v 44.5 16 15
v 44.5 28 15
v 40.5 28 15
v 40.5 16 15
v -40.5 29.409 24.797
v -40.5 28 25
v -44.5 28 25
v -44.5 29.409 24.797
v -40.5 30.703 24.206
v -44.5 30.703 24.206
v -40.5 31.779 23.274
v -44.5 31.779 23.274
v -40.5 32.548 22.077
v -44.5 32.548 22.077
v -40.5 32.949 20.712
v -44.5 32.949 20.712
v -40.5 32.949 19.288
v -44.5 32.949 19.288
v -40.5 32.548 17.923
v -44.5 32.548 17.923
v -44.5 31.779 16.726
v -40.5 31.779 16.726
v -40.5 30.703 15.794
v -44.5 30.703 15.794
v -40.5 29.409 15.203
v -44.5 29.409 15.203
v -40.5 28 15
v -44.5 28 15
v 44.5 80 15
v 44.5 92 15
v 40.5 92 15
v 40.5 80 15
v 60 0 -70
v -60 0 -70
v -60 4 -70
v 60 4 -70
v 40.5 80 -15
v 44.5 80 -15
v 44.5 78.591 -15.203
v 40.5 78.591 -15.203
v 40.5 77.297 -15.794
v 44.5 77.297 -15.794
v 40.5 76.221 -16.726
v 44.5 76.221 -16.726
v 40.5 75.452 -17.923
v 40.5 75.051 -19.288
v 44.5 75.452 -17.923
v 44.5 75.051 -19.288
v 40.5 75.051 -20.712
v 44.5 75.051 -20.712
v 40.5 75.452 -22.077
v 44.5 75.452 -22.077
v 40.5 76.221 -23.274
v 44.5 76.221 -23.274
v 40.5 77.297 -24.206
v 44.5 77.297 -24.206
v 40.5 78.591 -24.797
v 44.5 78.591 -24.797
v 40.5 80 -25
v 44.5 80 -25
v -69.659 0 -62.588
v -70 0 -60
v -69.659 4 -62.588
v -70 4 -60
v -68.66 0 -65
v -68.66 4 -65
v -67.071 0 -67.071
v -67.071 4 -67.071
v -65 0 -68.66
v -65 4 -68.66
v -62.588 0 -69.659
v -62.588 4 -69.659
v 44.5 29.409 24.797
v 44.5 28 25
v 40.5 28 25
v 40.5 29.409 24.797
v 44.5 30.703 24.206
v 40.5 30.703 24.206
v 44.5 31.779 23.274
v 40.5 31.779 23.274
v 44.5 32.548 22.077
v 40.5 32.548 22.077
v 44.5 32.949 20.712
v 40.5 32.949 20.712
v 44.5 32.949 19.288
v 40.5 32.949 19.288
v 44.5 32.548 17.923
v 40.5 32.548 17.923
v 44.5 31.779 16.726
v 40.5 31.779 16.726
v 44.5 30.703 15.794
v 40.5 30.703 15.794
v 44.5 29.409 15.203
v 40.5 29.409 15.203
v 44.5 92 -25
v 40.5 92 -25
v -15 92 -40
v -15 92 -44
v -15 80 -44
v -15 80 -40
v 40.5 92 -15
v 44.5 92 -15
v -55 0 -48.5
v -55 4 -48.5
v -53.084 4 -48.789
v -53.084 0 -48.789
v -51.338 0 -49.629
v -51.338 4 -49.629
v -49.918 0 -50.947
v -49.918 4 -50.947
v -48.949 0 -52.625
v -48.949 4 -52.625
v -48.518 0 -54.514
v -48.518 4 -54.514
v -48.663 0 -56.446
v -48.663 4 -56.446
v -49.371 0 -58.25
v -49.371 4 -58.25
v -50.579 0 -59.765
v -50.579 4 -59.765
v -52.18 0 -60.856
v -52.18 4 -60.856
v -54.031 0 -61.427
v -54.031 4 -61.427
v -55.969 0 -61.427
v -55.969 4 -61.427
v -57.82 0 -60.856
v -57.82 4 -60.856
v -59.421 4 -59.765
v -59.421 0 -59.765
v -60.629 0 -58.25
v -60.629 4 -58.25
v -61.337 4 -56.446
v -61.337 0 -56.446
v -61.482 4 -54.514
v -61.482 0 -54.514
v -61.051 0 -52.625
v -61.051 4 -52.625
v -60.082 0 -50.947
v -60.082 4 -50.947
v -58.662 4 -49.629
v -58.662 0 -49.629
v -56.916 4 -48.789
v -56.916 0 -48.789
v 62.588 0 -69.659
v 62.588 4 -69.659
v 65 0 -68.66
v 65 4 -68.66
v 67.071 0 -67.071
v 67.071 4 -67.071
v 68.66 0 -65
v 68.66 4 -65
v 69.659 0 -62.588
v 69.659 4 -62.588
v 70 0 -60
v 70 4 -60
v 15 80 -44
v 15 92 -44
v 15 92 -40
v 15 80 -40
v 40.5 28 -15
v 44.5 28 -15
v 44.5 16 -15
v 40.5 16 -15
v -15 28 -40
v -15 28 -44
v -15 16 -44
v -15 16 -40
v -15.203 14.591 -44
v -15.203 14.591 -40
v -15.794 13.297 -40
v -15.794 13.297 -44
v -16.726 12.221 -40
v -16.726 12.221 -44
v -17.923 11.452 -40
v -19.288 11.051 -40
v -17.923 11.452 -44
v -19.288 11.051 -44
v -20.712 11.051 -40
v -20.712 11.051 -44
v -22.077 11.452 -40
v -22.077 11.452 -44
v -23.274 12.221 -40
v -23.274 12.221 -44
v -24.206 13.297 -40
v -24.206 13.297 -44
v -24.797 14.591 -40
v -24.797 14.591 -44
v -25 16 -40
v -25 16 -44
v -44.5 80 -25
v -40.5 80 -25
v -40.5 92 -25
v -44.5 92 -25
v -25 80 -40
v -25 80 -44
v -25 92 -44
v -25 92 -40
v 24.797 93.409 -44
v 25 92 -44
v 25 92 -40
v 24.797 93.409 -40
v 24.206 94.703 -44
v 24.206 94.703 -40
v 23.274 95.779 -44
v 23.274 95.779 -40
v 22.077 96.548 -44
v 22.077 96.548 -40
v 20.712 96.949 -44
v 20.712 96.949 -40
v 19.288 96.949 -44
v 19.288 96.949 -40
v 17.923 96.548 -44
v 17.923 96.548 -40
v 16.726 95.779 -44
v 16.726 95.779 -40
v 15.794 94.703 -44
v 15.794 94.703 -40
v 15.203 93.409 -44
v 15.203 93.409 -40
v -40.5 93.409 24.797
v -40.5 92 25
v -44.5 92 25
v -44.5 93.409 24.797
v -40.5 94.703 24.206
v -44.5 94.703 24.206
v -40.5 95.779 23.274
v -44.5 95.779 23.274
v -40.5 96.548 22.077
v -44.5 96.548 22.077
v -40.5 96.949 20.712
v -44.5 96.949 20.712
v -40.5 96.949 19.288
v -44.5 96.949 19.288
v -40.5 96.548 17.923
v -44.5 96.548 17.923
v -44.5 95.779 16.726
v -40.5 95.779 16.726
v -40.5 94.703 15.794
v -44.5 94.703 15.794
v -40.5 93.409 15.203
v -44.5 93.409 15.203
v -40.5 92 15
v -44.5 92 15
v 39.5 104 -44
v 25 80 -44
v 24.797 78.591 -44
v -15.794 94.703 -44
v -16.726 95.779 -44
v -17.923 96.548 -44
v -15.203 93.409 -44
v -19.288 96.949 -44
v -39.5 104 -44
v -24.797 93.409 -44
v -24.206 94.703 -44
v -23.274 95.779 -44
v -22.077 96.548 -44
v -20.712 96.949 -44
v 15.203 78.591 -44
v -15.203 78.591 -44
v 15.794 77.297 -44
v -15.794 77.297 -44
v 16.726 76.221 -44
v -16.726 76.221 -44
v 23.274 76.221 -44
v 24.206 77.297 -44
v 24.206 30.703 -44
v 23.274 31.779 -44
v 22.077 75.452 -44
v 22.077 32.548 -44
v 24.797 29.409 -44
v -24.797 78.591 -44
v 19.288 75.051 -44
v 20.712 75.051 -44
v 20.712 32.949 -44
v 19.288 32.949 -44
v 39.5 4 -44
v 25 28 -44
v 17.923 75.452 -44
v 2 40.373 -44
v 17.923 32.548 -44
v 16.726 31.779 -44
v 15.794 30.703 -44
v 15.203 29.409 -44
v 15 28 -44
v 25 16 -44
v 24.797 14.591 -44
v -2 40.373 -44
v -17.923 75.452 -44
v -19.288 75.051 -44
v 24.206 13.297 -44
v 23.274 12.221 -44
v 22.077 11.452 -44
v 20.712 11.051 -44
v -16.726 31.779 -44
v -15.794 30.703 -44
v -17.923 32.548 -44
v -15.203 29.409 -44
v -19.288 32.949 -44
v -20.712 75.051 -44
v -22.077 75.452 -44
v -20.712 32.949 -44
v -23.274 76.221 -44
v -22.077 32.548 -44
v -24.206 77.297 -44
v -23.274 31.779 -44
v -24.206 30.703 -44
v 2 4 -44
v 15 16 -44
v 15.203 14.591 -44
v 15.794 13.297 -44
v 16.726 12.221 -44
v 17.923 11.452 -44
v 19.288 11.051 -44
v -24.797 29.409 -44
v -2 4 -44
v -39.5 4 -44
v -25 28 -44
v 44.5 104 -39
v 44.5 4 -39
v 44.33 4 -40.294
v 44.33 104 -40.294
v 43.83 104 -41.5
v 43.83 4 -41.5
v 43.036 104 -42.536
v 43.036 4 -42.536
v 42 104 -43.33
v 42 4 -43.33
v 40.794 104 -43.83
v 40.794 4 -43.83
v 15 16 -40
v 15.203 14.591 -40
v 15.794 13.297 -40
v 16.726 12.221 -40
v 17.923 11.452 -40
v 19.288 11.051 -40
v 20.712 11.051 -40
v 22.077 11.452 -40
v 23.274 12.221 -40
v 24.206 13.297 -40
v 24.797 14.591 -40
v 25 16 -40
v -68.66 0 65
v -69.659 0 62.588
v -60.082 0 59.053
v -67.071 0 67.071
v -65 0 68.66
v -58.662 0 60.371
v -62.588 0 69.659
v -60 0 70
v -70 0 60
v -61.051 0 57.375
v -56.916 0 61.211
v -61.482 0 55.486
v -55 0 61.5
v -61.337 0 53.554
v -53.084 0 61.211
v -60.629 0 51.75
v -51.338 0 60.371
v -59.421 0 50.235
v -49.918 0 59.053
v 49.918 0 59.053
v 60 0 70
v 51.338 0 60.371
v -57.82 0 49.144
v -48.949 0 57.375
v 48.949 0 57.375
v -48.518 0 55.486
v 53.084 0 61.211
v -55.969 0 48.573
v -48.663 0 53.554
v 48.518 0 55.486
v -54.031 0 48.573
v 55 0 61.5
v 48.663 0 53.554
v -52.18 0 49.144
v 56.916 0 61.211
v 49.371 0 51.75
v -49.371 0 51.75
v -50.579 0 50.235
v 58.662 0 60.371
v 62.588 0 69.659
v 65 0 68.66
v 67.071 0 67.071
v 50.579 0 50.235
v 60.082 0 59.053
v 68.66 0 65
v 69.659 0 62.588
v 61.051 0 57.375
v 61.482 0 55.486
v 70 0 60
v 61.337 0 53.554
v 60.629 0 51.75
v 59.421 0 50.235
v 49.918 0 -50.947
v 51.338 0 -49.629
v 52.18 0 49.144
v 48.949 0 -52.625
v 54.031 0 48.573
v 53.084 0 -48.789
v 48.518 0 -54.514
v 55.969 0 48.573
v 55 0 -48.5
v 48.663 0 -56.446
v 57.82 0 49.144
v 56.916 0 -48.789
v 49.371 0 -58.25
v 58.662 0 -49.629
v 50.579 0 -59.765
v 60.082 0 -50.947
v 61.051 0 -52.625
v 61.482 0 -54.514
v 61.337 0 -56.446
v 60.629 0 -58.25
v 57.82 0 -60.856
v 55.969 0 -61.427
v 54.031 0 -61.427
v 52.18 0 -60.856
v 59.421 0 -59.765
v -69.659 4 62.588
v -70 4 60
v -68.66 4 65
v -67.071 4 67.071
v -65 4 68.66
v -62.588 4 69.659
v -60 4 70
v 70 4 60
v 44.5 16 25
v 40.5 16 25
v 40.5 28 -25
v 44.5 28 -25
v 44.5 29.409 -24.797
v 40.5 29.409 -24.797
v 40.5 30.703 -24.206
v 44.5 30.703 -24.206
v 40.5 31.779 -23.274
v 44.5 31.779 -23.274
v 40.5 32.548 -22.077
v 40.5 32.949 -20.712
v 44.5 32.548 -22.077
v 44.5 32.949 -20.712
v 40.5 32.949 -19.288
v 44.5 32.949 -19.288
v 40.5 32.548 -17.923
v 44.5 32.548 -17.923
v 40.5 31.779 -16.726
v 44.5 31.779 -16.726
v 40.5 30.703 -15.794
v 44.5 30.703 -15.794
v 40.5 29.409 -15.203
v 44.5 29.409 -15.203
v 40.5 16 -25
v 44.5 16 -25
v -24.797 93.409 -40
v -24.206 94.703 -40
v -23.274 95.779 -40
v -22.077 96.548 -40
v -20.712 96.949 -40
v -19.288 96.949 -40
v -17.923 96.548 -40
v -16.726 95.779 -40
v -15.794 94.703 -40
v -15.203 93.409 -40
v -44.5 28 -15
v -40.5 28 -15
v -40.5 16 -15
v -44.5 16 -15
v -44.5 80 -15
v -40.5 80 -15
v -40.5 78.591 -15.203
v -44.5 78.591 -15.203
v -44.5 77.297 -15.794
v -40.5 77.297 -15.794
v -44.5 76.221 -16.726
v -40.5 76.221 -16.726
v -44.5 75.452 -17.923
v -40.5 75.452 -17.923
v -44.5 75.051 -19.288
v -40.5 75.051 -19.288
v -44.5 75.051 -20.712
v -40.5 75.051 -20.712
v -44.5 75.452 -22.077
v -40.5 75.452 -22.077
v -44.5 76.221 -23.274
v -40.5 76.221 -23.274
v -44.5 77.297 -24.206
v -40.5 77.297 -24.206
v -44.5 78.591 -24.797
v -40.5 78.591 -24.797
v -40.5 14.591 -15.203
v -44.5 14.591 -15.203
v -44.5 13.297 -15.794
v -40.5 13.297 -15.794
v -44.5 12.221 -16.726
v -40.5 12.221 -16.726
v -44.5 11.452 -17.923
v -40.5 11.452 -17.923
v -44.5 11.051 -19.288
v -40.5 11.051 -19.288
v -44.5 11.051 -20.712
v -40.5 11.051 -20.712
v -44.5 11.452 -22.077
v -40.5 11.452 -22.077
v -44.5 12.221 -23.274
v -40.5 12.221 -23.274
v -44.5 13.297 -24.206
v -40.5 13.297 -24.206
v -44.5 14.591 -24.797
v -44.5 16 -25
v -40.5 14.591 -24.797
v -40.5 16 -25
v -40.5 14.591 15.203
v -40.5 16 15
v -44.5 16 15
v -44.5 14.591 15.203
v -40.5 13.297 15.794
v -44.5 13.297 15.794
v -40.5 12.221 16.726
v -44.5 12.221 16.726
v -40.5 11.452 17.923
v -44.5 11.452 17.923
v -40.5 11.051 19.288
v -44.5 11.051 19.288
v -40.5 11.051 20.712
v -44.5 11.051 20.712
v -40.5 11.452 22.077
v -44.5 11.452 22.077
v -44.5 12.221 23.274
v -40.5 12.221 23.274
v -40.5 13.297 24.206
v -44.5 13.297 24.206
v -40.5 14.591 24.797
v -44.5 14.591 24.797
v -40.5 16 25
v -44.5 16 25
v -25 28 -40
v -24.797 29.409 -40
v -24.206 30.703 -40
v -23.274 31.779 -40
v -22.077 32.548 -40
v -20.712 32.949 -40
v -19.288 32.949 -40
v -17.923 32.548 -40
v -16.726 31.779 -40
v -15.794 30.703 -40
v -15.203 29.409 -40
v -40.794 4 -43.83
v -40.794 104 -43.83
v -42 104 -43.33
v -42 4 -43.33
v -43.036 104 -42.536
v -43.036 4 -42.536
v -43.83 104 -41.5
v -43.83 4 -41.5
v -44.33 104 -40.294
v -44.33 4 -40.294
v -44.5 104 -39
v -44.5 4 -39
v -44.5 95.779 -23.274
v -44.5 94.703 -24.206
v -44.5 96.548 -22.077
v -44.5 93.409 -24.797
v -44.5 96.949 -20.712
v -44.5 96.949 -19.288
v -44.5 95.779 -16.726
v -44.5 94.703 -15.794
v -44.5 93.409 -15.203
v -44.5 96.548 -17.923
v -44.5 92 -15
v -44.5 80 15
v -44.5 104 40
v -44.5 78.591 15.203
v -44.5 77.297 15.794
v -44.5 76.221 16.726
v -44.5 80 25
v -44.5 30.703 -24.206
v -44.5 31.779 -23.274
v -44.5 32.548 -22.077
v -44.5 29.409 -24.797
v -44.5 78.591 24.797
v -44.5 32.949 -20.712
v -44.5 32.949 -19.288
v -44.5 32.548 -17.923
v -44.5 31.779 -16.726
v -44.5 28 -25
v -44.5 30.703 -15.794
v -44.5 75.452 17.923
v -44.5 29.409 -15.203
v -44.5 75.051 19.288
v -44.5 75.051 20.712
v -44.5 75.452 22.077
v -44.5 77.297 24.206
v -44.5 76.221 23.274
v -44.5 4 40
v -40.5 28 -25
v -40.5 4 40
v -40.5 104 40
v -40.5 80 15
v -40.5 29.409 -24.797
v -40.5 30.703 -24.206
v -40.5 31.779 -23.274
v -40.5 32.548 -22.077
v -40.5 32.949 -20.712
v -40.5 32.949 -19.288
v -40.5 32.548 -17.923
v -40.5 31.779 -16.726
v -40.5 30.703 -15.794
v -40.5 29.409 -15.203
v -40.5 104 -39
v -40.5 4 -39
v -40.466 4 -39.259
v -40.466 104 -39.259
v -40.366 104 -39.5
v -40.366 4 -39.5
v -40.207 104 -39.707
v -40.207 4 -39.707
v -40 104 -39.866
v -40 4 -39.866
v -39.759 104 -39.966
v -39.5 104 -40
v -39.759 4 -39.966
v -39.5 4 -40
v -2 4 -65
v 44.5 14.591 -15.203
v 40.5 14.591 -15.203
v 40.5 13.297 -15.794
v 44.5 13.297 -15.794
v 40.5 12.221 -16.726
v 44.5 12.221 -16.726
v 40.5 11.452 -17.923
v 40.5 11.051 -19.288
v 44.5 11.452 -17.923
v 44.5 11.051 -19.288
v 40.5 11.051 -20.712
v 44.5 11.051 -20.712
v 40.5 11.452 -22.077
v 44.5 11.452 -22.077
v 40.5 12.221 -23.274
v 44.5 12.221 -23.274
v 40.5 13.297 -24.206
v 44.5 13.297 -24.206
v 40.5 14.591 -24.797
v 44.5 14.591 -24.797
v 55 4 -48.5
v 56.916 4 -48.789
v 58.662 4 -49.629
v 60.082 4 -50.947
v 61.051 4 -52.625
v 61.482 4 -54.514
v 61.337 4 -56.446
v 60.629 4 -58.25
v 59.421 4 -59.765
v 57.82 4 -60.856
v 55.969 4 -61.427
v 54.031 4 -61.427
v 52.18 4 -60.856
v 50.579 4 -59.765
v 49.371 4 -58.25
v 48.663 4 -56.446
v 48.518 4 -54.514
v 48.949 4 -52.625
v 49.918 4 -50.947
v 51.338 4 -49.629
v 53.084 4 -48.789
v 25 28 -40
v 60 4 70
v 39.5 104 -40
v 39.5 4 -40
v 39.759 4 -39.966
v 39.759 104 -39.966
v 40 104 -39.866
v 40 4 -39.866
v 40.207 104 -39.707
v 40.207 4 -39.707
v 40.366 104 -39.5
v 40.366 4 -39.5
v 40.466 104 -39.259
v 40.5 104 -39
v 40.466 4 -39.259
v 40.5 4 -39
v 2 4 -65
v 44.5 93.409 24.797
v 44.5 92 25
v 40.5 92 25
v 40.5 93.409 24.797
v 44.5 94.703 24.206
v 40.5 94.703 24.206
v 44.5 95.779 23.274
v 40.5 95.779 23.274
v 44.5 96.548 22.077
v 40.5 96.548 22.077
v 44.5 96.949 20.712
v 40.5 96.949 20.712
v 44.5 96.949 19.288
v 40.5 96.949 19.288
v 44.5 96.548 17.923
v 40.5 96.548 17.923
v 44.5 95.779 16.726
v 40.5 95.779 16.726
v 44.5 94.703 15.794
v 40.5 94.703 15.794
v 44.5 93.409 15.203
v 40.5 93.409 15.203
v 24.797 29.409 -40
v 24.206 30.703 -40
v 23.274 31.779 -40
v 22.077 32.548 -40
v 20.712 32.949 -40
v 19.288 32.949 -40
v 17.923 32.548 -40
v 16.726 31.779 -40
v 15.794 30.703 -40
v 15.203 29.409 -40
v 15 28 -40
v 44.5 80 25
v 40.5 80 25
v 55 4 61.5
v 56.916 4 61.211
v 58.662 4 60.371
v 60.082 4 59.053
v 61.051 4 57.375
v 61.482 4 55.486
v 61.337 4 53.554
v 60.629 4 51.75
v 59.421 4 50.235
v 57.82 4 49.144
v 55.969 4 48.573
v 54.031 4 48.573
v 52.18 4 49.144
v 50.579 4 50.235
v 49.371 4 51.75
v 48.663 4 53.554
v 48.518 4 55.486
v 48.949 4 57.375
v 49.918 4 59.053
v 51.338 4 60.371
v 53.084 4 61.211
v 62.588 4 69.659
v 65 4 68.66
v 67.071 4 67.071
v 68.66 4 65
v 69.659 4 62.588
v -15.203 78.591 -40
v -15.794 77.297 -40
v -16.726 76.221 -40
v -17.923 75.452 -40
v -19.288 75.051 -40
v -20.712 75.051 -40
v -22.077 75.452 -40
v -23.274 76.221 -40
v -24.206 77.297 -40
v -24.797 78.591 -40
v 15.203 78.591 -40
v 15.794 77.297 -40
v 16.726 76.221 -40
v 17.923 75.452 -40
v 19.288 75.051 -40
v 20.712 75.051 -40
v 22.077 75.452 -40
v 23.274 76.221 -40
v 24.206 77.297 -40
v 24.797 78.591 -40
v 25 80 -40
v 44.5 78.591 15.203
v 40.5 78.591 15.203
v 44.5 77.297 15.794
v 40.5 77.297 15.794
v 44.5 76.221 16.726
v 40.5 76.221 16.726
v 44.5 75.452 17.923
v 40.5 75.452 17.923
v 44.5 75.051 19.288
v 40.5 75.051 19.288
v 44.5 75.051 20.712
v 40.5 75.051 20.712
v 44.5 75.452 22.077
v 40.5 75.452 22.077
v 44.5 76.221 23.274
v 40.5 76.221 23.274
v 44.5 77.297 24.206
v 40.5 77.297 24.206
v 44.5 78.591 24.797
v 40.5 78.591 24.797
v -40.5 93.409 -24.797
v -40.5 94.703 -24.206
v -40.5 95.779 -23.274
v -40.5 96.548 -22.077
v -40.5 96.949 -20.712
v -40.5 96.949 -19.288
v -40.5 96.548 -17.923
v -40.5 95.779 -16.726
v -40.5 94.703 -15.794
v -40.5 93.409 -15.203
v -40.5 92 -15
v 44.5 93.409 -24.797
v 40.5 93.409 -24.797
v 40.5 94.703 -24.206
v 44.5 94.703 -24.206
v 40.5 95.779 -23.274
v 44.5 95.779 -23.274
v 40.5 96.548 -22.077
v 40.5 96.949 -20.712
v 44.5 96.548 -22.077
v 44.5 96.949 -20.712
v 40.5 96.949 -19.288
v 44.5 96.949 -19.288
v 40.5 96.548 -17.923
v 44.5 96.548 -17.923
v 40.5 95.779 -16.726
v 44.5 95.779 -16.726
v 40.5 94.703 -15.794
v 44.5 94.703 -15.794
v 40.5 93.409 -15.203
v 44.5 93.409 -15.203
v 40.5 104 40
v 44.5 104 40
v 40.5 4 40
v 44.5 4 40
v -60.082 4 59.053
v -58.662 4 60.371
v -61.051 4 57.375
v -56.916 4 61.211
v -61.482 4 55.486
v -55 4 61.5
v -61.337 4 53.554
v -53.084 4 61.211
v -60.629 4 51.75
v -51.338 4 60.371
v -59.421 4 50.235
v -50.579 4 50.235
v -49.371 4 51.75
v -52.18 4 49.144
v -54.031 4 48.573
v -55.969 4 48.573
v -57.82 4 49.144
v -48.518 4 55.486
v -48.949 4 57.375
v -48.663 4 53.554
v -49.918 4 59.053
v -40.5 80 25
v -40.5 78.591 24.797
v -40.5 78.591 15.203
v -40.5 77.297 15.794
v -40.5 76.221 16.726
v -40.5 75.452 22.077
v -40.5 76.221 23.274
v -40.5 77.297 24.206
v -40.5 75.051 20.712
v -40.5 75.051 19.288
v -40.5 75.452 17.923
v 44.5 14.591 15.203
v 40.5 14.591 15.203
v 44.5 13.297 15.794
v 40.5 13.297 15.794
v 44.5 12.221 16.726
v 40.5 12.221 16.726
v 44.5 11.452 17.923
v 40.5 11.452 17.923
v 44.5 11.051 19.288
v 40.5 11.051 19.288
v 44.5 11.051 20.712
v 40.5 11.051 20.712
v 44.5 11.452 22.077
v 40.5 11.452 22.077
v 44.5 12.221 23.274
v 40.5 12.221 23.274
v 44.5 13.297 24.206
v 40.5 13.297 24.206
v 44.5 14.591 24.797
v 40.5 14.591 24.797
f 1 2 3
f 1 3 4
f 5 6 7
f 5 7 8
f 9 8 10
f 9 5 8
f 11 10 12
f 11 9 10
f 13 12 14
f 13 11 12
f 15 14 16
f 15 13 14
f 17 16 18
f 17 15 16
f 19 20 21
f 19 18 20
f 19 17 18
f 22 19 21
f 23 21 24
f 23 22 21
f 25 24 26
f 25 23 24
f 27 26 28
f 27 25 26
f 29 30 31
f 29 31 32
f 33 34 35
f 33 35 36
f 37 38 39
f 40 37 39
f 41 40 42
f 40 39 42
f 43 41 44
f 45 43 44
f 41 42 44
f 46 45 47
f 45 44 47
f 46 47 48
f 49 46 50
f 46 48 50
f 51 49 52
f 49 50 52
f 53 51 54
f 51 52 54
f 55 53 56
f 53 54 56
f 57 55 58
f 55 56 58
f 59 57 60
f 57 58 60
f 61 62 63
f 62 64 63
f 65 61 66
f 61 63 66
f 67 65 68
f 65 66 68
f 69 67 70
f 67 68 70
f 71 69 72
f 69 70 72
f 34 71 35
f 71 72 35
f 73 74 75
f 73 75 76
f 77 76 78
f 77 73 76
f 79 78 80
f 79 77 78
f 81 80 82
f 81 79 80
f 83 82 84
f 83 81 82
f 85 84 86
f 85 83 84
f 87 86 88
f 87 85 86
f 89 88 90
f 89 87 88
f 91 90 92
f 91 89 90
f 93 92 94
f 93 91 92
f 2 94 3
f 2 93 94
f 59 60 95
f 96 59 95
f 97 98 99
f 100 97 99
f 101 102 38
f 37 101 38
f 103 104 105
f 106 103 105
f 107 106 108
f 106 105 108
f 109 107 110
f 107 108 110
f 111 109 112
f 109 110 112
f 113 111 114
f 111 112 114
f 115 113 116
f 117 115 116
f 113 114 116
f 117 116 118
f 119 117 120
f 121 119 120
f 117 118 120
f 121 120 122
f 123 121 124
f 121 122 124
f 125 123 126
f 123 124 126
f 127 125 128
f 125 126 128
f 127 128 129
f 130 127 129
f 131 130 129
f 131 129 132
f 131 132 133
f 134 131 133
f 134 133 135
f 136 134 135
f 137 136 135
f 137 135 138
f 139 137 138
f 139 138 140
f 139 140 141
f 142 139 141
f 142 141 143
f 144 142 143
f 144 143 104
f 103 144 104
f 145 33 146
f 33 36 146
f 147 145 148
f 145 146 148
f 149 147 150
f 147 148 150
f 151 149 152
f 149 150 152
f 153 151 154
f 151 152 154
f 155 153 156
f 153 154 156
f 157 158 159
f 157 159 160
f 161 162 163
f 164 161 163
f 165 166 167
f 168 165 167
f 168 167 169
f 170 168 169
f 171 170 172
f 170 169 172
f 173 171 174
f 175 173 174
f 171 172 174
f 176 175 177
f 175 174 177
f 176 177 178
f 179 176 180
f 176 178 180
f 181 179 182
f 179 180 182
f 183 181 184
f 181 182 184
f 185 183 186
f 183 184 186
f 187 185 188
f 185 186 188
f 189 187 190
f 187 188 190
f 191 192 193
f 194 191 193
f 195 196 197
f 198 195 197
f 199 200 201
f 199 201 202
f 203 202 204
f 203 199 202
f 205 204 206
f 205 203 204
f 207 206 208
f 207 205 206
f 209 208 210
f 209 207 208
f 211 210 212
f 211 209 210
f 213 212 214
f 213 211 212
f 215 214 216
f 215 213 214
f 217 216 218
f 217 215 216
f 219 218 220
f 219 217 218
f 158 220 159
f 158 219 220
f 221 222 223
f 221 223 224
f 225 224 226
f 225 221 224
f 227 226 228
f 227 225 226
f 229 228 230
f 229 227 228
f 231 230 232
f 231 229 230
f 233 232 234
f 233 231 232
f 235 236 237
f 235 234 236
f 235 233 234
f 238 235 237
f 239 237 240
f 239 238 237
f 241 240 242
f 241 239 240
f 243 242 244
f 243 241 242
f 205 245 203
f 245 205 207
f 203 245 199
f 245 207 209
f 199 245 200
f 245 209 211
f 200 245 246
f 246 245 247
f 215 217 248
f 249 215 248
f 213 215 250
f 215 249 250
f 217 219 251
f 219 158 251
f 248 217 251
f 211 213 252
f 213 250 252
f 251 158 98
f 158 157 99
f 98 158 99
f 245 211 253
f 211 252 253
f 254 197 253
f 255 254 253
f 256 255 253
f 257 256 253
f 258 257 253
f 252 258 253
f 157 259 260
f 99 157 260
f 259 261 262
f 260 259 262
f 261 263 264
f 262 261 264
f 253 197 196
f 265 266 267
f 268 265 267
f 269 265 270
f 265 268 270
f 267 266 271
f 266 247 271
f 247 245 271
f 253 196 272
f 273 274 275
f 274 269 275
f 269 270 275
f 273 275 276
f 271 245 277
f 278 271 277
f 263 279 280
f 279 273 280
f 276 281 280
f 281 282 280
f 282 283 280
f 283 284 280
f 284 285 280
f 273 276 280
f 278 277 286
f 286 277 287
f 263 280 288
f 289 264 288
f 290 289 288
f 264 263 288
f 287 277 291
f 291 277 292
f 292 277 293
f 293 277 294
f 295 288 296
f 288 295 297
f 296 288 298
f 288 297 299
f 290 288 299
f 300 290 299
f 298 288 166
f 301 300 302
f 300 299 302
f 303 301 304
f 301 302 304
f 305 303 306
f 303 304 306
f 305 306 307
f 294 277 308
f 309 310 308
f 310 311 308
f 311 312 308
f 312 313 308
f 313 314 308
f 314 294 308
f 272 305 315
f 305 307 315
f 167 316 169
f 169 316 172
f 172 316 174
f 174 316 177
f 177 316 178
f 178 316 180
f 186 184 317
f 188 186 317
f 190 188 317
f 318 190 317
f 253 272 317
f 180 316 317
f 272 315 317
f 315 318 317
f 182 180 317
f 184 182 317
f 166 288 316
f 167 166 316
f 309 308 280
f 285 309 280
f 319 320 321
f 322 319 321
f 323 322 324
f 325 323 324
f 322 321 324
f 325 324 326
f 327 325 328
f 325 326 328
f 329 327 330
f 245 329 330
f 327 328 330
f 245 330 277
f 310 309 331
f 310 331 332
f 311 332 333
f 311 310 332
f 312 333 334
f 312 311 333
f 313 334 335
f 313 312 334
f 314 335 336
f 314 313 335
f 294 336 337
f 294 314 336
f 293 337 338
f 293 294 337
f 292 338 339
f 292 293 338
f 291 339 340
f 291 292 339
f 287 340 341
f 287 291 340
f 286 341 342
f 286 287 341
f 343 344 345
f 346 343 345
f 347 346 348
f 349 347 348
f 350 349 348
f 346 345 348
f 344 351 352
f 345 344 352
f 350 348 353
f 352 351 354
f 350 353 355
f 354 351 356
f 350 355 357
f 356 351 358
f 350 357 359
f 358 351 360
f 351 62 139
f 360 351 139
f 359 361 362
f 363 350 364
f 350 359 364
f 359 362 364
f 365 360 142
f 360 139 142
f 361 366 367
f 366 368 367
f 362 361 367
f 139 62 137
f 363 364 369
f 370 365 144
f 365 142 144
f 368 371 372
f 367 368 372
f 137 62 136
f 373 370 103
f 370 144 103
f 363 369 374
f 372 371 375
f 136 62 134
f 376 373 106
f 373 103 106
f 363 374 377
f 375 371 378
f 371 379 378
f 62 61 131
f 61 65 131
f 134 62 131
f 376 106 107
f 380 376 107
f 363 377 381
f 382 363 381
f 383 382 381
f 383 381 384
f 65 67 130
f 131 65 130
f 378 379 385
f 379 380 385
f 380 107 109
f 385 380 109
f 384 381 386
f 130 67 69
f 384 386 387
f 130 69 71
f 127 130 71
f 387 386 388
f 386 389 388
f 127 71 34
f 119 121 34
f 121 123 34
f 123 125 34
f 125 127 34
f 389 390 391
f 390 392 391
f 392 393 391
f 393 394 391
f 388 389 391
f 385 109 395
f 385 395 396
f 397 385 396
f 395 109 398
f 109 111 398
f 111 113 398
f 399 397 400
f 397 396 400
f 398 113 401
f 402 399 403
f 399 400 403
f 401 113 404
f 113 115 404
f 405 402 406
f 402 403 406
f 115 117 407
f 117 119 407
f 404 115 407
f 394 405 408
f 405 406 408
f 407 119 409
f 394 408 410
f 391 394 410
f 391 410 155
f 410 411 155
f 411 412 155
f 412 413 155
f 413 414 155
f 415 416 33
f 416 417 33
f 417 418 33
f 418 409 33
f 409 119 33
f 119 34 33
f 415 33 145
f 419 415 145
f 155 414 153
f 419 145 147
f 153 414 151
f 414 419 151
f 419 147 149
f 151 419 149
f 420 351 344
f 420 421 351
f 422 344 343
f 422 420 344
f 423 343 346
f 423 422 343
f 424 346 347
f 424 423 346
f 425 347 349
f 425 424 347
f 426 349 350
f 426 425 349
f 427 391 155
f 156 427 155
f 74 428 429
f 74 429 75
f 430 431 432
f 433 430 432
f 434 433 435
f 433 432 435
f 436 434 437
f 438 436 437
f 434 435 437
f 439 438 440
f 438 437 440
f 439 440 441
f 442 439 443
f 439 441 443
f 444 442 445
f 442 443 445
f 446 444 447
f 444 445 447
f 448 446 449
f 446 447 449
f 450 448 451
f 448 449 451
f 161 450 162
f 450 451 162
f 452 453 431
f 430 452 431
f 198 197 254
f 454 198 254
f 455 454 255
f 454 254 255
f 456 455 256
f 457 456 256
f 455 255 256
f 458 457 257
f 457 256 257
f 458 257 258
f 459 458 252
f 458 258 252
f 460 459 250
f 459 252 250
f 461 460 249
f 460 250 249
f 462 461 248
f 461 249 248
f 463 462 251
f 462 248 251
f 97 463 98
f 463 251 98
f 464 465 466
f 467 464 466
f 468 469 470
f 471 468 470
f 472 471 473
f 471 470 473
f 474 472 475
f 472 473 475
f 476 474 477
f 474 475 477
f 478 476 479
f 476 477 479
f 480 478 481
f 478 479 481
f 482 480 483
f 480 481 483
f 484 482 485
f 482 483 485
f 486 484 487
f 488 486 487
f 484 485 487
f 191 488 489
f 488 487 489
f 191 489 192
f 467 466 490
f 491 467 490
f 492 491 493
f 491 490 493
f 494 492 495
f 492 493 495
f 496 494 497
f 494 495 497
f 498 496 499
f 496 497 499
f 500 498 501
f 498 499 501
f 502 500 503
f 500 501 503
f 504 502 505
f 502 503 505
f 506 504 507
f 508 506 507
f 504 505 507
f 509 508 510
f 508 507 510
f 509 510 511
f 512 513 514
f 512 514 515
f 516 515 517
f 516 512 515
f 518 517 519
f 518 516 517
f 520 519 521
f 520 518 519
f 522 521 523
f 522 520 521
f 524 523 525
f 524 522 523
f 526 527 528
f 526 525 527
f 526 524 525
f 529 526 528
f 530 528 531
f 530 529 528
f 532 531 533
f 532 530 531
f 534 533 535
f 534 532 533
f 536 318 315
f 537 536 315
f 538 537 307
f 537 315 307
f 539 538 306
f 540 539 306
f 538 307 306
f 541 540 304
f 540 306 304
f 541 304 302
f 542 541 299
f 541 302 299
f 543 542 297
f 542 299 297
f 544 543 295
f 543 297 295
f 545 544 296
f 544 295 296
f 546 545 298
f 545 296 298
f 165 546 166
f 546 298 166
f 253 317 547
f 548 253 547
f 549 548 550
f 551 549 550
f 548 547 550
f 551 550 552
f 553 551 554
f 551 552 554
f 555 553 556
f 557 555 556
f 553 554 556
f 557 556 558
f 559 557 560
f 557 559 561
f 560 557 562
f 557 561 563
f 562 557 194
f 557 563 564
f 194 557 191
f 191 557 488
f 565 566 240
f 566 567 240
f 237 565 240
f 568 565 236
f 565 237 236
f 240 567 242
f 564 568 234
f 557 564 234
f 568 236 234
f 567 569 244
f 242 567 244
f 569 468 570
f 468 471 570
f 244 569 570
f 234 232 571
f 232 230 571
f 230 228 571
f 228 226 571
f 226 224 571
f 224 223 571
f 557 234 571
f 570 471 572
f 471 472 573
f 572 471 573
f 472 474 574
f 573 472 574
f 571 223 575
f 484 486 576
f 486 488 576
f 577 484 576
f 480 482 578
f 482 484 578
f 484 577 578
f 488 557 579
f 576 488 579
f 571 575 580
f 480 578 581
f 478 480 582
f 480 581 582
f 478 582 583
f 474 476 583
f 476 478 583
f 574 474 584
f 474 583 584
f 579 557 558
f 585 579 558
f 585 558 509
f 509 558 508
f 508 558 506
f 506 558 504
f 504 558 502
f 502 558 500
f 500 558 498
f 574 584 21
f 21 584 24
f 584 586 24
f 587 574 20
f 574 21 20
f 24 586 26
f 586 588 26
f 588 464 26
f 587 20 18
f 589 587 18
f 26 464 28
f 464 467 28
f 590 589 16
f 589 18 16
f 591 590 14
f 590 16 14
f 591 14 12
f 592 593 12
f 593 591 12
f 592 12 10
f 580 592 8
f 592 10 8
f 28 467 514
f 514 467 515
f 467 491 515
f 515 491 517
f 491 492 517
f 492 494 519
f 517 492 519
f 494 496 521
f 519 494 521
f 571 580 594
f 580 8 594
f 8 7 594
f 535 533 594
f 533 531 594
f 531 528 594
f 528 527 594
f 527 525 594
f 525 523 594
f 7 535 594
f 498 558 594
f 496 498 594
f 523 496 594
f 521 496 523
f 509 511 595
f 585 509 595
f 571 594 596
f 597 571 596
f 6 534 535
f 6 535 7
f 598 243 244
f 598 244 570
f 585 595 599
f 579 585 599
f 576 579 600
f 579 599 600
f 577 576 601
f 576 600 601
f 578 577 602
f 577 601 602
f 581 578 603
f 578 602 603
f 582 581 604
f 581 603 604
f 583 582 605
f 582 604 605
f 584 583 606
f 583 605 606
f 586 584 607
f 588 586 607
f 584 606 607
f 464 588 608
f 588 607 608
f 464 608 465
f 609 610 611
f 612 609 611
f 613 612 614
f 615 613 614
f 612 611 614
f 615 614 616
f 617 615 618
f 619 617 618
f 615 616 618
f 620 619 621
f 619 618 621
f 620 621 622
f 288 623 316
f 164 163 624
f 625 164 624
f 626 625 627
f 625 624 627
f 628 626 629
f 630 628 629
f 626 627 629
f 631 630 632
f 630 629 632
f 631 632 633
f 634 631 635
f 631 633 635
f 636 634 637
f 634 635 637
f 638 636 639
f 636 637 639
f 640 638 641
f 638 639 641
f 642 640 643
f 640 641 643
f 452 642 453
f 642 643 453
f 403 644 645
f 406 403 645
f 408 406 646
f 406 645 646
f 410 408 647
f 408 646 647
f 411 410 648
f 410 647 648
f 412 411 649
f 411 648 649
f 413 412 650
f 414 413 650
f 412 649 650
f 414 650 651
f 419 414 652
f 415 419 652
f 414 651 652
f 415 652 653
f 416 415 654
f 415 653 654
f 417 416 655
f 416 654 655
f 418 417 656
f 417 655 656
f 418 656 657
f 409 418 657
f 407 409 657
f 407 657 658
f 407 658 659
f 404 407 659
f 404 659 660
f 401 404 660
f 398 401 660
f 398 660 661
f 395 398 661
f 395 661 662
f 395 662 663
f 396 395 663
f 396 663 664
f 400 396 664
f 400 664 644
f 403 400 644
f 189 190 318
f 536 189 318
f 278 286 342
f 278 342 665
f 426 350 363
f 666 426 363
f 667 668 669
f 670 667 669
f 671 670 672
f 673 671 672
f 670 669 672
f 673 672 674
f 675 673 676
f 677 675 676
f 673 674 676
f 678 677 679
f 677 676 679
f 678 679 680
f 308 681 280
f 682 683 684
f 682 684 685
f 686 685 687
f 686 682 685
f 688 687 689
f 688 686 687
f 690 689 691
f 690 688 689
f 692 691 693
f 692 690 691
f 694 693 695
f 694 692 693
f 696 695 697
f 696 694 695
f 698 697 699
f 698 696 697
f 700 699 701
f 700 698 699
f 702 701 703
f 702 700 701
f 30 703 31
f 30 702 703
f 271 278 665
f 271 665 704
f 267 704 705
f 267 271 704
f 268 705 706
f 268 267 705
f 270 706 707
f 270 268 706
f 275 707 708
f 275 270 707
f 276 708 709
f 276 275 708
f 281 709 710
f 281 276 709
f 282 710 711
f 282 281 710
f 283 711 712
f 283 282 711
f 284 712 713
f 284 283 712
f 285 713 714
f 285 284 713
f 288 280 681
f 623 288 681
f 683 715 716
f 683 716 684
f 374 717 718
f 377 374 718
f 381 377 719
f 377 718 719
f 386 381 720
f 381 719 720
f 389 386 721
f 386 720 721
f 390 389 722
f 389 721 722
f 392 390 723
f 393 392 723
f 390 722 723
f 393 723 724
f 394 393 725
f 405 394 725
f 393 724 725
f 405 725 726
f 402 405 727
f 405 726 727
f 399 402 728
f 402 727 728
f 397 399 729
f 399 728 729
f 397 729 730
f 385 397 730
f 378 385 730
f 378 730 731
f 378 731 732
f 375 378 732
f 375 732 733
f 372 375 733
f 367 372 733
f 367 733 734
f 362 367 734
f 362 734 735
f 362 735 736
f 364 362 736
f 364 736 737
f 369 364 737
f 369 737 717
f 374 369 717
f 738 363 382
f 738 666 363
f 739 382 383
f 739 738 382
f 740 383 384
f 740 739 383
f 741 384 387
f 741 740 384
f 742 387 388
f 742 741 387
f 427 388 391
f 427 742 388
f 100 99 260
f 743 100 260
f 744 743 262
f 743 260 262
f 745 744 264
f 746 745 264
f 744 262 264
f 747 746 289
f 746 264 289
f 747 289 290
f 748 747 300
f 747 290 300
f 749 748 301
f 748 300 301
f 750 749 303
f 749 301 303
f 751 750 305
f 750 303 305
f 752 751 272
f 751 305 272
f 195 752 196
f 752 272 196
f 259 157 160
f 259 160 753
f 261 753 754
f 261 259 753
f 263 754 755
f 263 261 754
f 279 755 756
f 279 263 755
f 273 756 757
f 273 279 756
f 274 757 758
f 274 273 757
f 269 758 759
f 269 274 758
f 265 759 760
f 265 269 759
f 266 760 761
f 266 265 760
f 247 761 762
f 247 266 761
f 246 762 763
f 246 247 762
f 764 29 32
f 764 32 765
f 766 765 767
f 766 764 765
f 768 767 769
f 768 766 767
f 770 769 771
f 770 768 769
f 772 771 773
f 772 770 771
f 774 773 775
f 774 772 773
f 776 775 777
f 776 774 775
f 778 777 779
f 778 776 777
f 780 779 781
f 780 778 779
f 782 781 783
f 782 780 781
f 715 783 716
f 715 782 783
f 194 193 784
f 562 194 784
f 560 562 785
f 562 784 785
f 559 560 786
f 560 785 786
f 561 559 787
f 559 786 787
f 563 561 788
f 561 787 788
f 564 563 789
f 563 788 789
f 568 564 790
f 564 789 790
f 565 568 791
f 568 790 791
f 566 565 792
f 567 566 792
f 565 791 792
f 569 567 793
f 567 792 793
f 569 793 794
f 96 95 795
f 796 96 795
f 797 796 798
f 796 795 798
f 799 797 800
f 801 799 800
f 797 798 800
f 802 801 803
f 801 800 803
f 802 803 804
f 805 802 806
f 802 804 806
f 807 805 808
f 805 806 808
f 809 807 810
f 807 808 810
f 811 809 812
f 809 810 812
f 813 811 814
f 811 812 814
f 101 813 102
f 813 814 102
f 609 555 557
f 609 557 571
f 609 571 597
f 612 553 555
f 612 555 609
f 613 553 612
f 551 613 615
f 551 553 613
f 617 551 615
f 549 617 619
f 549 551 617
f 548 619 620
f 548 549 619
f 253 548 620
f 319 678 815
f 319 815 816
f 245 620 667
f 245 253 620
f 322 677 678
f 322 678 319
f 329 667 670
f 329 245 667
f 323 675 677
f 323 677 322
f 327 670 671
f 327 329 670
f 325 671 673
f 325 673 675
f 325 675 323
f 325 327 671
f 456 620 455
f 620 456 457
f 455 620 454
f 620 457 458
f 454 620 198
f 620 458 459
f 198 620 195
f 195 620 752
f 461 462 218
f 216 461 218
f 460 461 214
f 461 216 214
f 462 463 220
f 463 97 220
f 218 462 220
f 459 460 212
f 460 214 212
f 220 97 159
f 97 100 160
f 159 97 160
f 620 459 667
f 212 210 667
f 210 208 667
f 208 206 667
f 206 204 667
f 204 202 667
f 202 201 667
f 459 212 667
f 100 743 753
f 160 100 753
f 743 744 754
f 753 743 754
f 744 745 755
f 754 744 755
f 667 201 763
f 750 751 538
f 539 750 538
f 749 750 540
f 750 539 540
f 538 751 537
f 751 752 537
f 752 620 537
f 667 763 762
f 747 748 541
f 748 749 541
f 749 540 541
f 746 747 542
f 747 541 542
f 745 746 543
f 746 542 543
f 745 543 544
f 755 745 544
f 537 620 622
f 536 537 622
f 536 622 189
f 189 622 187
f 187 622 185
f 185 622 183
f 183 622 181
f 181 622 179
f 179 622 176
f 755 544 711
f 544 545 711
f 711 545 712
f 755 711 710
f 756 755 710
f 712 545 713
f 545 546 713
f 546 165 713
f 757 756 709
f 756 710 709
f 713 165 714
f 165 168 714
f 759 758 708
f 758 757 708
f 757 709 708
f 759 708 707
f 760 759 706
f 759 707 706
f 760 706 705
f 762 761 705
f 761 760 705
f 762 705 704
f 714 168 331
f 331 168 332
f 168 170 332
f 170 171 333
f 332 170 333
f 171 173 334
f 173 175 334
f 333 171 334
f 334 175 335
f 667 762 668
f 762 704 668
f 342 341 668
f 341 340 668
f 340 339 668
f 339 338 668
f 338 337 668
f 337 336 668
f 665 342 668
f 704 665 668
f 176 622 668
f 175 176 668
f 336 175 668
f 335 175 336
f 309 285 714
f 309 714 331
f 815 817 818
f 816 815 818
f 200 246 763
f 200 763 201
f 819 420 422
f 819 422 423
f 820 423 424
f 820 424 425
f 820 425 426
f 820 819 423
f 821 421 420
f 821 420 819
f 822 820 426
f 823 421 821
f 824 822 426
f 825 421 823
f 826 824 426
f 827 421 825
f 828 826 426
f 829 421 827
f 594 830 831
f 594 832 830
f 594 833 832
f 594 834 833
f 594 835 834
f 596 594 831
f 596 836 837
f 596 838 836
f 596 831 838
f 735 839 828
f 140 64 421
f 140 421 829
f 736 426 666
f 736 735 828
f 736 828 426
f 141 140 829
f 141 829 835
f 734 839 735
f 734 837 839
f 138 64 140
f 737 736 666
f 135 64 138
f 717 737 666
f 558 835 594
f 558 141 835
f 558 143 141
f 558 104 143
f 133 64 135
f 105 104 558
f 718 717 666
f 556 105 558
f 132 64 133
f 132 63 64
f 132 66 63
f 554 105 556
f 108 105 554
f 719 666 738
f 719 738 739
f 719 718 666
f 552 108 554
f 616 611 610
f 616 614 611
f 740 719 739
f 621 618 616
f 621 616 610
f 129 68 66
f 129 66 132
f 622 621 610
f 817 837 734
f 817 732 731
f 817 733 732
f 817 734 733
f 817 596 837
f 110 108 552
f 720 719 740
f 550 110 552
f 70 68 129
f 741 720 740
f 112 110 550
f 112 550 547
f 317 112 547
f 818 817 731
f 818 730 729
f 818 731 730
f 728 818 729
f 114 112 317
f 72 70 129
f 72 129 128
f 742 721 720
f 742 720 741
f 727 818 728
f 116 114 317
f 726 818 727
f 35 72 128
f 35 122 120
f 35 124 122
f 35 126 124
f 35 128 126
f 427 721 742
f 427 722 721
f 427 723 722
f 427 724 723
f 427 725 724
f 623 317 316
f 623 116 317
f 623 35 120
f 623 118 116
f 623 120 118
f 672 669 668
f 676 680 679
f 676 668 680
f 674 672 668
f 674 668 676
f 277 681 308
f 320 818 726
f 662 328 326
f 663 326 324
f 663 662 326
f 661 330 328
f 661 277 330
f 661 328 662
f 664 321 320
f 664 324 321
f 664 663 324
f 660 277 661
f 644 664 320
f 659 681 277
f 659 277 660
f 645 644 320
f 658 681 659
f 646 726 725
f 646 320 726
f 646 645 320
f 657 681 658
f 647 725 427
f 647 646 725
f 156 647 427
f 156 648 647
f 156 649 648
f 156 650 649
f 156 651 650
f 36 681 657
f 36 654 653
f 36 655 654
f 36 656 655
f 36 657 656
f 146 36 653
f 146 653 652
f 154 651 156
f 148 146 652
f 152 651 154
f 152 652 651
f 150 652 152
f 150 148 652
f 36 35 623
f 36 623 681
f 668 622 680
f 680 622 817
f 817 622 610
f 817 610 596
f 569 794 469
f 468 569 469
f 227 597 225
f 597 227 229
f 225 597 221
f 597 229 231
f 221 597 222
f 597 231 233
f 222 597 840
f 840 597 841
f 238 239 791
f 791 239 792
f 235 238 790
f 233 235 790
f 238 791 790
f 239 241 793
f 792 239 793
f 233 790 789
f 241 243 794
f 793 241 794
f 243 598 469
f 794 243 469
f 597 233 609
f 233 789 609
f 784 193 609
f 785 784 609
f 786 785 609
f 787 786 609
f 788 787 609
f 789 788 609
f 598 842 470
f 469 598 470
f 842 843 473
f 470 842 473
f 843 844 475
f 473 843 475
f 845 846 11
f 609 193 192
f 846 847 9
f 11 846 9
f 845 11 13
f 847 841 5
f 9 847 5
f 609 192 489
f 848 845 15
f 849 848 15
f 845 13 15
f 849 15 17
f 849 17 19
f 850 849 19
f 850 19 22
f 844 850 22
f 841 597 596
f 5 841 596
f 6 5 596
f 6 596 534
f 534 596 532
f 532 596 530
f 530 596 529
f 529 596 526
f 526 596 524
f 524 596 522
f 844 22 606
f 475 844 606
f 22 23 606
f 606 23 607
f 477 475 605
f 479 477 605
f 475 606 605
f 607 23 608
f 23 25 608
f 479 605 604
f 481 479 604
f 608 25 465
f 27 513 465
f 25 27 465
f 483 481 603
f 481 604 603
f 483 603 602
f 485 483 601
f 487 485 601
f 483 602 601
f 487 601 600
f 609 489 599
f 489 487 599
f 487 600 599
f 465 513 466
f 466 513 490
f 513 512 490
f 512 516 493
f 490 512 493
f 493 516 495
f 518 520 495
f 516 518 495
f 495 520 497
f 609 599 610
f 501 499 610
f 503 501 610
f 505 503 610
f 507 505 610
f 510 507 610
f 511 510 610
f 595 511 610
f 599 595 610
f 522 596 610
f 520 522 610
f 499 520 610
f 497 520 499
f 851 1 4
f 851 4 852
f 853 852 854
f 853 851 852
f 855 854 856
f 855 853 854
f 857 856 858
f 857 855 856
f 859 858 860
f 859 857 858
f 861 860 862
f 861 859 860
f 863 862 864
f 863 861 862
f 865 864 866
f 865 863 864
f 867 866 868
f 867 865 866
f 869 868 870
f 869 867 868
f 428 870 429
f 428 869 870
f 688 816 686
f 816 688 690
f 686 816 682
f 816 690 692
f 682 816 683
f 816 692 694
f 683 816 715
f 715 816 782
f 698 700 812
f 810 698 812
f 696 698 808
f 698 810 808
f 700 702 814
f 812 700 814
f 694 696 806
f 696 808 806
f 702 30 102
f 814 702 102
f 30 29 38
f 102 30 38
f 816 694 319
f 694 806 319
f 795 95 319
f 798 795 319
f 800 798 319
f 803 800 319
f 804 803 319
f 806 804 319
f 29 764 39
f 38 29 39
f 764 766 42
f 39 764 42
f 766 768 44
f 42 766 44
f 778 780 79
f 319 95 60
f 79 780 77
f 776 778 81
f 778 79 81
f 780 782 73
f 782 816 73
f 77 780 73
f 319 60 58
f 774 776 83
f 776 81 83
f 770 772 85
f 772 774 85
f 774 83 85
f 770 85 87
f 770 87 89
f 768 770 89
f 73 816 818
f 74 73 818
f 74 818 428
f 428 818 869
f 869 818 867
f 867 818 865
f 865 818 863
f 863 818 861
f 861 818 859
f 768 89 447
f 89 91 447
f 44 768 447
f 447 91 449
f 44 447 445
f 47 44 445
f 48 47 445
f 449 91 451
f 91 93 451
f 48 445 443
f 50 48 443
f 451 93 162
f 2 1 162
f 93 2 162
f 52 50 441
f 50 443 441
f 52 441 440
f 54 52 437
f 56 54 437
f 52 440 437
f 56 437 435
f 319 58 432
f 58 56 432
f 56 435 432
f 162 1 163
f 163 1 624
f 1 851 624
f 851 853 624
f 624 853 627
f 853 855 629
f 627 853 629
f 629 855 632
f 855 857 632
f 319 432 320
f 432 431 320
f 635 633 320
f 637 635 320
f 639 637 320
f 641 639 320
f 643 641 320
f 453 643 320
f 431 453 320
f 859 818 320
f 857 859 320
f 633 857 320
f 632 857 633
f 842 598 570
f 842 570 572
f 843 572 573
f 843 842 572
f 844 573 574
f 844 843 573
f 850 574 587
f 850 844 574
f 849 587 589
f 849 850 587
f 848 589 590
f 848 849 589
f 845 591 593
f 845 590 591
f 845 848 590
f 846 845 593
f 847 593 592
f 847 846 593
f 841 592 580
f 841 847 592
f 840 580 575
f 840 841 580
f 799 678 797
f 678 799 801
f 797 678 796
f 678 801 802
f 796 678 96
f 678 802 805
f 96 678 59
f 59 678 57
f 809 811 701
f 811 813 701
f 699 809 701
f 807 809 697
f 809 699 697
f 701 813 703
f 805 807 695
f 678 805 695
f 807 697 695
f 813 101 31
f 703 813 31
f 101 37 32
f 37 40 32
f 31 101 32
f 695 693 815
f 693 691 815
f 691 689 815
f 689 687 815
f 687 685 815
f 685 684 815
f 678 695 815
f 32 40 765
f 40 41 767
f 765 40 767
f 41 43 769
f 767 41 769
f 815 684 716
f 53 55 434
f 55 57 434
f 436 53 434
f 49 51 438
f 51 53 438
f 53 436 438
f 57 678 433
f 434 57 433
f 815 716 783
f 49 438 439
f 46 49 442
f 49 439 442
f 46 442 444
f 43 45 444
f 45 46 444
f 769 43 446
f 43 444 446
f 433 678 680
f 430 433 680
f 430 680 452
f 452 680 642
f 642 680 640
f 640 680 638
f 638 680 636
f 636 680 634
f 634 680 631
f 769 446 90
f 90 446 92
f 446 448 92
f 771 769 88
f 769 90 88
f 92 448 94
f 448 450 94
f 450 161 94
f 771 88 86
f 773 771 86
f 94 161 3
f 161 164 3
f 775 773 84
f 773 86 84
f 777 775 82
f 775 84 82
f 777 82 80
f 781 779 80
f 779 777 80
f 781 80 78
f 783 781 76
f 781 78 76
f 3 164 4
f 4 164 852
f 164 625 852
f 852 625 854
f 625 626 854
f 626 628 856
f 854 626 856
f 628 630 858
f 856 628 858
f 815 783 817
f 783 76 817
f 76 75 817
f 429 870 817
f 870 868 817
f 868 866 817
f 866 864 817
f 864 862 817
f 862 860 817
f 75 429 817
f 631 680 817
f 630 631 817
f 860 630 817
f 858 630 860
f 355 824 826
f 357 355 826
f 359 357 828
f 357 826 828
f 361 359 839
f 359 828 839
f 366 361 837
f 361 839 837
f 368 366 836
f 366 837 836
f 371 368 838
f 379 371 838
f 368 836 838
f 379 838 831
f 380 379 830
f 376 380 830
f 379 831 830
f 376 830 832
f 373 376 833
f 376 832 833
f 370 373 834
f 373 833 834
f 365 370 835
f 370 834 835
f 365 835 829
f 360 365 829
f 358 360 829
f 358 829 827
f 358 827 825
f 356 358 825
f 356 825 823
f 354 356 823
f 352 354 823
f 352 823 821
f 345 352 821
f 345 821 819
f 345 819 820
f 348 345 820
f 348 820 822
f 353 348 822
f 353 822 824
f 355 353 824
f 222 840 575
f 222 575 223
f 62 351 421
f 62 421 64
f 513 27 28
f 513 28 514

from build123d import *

# Parameters (mm, degrees)
SKETCH_2_W          = 140
SKETCH_2_H          = 140
EXTRUDE_1_DEPTH     = 4
EXTRUDE_1_2_DEPTH   = 100
EXTRUDE_2_DEPTH     = 2
CUT_EXTRUDE_1_DEPTH = 115.5
SKETCH_6_R          = 6.5
CUT_EXTRUDE_2_DEPTH = 5
FILLET_1_R          = 10
CUT_EXTRUDE_3_REACH = 116


with BuildPart() as part:
    # Эскиз2 → Extrude 1 (new body)
    with BuildSketch(Plane(origin=(0, 0, 0), x_dir=(1, 0, 0), z_dir=(0, 1, 0))):
        Rectangle(SKETCH_2_W, SKETCH_2_H)
    extrude(amount=EXTRUDE_1_DEPTH)

    # Эскиз3 → Extrude 1 2 (add)
    with BuildSketch(Plane(origin=(0, 4, 0), x_dir=(1, 0, 0), z_dir=(0, 1, 0))):
        with BuildLine():
            Line((-40.5, -40), (-40.5, 39))
            ThreePointArc((-40.5, 39), (-40.207106781, 39.707106781), (-39.5, 40))
            Line((-39.5, 40), (39.5, 40))
            ThreePointArc((39.5, 40), (40.207106781, 39.707106781), (40.5, 39))
            Line((40.5, 39), (40.5, -40))
            Line((40.5, -40), (44.5, -40))
            Line((44.5, -40), (44.5, 39))
            ThreePointArc((44.5, 39), (43.035533906, 42.535533906), (39.5, 44))
            Line((39.5, 44), (-39.5, 44))
            ThreePointArc((-39.5, 44), (-43.035533906, 42.535533906), (-44.5, 39))
            Line((-44.5, 39), (-44.5, -40))
            Line((-44.5, -40), (-40.5, -40))
        make_face()
    extrude(amount=EXTRUDE_1_2_DEPTH)

    # Эскиз4 → Бобышка-Вытянуть2 (add, symmetric)
    with BuildSketch(Plane(origin=(0, 0, 0), x_dir=(0, 0, -1), z_dir=(1, 0, 0))):
        Polygon((44, 40.373066959), (65, 4), (44, 4), align=None)
    extrude(amount=EXTRUDE_2_DEPTH, both=True)

    # Эскиз5 → Вырез-Вытянуть1 (cut, through all)
    with BuildSketch(Plane(origin=(44.5, 0, 0), x_dir=(0, 0, -1), z_dir=(1, 0, 0))):
        with BuildLine():
            Line((-15, 92), (-15, 80))
            ThreePointArc((-15, 80), (-20, 75), (-25, 80))
            Line((-25, 80), (-25, 92))
            ThreePointArc((-25, 92), (-20, 97), (-15, 92))
        make_face()
        with BuildLine():
            Line((-15, 28), (-15, 16))
            ThreePointArc((-15, 16), (-20, 11), (-25, 16))
            Line((-25, 16), (-25, 28))
            ThreePointArc((-25, 28), (-20, 33), (-15, 28))
        make_face()
        with BuildLine():
            Line((15, 92), (15, 80))
            ThreePointArc((15, 80), (20, 75), (25, 80))
            Line((25, 80), (25, 92))
            ThreePointArc((25, 92), (20, 97), (15, 92))
        make_face()
        with BuildLine():
            Line((15, 28), (15, 16))
            ThreePointArc((15, 16), (20, 11), (25, 16))
            Line((25, 16), (25, 28))
            ThreePointArc((25, 28), (20, 33), (15, 28))
        make_face()
    extrude(amount=-CUT_EXTRUDE_1_DEPTH, mode=Mode.SUBTRACT)

    # Эскиз6 → Вырез-Вытянуть2 (cut, through all)
    with BuildSketch(Plane(origin=(0, 4, 0), x_dir=(1, 0, 0), z_dir=(0, 1, 0))):
        with Locations(Location((-55, 55, 0), (0, 0, 270))):  # turned: the seam where the file's is
            Circle(SKETCH_6_R)
        with Locations(Location((-55, -55, 0), (0, 0, 270))):  # turned: the seam where the file's is
            Circle(SKETCH_6_R)
        with Locations(Location((55, 55, 0), (0, 0, 270))):  # turned: the seam where the file's is
            Circle(SKETCH_6_R)
        with Locations(Location((55, -55, 0), (0, 0, 270))):  # turned: the seam where the file's is
            Circle(SKETCH_6_R)
    extrude(amount=-CUT_EXTRUDE_2_DEPTH, mode=Mode.SUBTRACT)

    # Скругление1
    fillet_1_edges = [part.edges().sort_by_distance(p)[0] for p in [
        (70, 2, 70),
        (-70, 2, 70),
        (-70, 2, -70),
        (70, 2, -70),
    ]]
    fillet(fillet_1_edges, radius=FILLET_1_R)

    # Эскиз8 → Вырез-Вытянуть3 (cut, up to next)
    with BuildSketch(Plane(origin=(0, 0, -44), x_dir=(-1, 0, 0), z_dir=(0, 0, -1)), mode=Mode.PRIVATE) as cut_extrude_3_sk1:
        with BuildLine():
            Line((-15, 92), (-15, 80))
            ThreePointArc((-15, 80), (-20, 75), (-25, 80))
            Line((-25, 80), (-25, 92))
            ThreePointArc((-25, 92), (-20, 97), (-15, 92))
        make_face()
    cut_extrude_3_tool1 = extrude(cut_extrude_3_sk1.sketch, amount=-CUT_EXTRUDE_3_REACH, mode=Mode.PRIVATE) & part.part
    add(cut_extrude_3_tool1.solids().sort_by_distance((20, 86, -44))[0], mode=Mode.SUBTRACT)
    # Эскиз8 → Вырез-Вытянуть3 (cut, up to next)
    with BuildSketch(Plane(origin=(0, 0, -44), x_dir=(-1, 0, 0), z_dir=(0, 0, -1)), mode=Mode.PRIVATE) as cut_extrude_3_sk2:
        with BuildLine():
            Line((-15, 28), (-15, 16))
            ThreePointArc((-15, 16), (-20, 11), (-25, 16))
            Line((-25, 16), (-25, 28))
            ThreePointArc((-25, 28), (-20, 33), (-15, 28))
        make_face()
    cut_extrude_3_tool2 = extrude(cut_extrude_3_sk2.sketch, amount=-CUT_EXTRUDE_3_REACH, mode=Mode.PRIVATE) & part.part
    add(cut_extrude_3_tool2.solids().sort_by_distance((20, 22, -44))[0], mode=Mode.SUBTRACT)
    # Эскиз8 → Вырез-Вытянуть3 (cut, up to next)
    with BuildSketch(Plane(origin=(0, 0, -44), x_dir=(-1, 0, 0), z_dir=(0, 0, -1)), mode=Mode.PRIVATE) as cut_extrude_3_sk3:
        with BuildLine():
            Line((15, 92), (15, 80))
            ThreePointArc((15, 80), (20, 75), (25, 80))
            Line((25, 80), (25, 92))
            ThreePointArc((25, 92), (20, 97), (15, 92))
        make_face()
    cut_extrude_3_tool3 = extrude(cut_extrude_3_sk3.sketch, amount=-CUT_EXTRUDE_3_REACH, mode=Mode.PRIVATE) & part.part
    add(cut_extrude_3_tool3.solids().sort_by_distance((-20, 86, -44))[0], mode=Mode.SUBTRACT)
    # Эскиз8 → Вырез-Вытянуть3 (cut, up to next)
    with BuildSketch(Plane(origin=(0, 0, -44), x_dir=(-1, 0, 0), z_dir=(0, 0, -1)), mode=Mode.PRIVATE) as cut_extrude_3_sk4:
        with BuildLine():
            Line((15, 28), (15, 16))
            ThreePointArc((15, 16), (20, 11), (25, 16))
            Line((25, 16), (25, 28))
            ThreePointArc((25, 28), (20, 33), (15, 28))
        make_face()
    cut_extrude_3_tool4 = extrude(cut_extrude_3_sk4.sketch, amount=-CUT_EXTRUDE_3_REACH, mode=Mode.PRIVATE) & part.part
    add(cut_extrude_3_tool4.solids().sort_by_distance((-20, 22, -44))[0], mode=Mode.SUBTRACT)


solid = part.part
